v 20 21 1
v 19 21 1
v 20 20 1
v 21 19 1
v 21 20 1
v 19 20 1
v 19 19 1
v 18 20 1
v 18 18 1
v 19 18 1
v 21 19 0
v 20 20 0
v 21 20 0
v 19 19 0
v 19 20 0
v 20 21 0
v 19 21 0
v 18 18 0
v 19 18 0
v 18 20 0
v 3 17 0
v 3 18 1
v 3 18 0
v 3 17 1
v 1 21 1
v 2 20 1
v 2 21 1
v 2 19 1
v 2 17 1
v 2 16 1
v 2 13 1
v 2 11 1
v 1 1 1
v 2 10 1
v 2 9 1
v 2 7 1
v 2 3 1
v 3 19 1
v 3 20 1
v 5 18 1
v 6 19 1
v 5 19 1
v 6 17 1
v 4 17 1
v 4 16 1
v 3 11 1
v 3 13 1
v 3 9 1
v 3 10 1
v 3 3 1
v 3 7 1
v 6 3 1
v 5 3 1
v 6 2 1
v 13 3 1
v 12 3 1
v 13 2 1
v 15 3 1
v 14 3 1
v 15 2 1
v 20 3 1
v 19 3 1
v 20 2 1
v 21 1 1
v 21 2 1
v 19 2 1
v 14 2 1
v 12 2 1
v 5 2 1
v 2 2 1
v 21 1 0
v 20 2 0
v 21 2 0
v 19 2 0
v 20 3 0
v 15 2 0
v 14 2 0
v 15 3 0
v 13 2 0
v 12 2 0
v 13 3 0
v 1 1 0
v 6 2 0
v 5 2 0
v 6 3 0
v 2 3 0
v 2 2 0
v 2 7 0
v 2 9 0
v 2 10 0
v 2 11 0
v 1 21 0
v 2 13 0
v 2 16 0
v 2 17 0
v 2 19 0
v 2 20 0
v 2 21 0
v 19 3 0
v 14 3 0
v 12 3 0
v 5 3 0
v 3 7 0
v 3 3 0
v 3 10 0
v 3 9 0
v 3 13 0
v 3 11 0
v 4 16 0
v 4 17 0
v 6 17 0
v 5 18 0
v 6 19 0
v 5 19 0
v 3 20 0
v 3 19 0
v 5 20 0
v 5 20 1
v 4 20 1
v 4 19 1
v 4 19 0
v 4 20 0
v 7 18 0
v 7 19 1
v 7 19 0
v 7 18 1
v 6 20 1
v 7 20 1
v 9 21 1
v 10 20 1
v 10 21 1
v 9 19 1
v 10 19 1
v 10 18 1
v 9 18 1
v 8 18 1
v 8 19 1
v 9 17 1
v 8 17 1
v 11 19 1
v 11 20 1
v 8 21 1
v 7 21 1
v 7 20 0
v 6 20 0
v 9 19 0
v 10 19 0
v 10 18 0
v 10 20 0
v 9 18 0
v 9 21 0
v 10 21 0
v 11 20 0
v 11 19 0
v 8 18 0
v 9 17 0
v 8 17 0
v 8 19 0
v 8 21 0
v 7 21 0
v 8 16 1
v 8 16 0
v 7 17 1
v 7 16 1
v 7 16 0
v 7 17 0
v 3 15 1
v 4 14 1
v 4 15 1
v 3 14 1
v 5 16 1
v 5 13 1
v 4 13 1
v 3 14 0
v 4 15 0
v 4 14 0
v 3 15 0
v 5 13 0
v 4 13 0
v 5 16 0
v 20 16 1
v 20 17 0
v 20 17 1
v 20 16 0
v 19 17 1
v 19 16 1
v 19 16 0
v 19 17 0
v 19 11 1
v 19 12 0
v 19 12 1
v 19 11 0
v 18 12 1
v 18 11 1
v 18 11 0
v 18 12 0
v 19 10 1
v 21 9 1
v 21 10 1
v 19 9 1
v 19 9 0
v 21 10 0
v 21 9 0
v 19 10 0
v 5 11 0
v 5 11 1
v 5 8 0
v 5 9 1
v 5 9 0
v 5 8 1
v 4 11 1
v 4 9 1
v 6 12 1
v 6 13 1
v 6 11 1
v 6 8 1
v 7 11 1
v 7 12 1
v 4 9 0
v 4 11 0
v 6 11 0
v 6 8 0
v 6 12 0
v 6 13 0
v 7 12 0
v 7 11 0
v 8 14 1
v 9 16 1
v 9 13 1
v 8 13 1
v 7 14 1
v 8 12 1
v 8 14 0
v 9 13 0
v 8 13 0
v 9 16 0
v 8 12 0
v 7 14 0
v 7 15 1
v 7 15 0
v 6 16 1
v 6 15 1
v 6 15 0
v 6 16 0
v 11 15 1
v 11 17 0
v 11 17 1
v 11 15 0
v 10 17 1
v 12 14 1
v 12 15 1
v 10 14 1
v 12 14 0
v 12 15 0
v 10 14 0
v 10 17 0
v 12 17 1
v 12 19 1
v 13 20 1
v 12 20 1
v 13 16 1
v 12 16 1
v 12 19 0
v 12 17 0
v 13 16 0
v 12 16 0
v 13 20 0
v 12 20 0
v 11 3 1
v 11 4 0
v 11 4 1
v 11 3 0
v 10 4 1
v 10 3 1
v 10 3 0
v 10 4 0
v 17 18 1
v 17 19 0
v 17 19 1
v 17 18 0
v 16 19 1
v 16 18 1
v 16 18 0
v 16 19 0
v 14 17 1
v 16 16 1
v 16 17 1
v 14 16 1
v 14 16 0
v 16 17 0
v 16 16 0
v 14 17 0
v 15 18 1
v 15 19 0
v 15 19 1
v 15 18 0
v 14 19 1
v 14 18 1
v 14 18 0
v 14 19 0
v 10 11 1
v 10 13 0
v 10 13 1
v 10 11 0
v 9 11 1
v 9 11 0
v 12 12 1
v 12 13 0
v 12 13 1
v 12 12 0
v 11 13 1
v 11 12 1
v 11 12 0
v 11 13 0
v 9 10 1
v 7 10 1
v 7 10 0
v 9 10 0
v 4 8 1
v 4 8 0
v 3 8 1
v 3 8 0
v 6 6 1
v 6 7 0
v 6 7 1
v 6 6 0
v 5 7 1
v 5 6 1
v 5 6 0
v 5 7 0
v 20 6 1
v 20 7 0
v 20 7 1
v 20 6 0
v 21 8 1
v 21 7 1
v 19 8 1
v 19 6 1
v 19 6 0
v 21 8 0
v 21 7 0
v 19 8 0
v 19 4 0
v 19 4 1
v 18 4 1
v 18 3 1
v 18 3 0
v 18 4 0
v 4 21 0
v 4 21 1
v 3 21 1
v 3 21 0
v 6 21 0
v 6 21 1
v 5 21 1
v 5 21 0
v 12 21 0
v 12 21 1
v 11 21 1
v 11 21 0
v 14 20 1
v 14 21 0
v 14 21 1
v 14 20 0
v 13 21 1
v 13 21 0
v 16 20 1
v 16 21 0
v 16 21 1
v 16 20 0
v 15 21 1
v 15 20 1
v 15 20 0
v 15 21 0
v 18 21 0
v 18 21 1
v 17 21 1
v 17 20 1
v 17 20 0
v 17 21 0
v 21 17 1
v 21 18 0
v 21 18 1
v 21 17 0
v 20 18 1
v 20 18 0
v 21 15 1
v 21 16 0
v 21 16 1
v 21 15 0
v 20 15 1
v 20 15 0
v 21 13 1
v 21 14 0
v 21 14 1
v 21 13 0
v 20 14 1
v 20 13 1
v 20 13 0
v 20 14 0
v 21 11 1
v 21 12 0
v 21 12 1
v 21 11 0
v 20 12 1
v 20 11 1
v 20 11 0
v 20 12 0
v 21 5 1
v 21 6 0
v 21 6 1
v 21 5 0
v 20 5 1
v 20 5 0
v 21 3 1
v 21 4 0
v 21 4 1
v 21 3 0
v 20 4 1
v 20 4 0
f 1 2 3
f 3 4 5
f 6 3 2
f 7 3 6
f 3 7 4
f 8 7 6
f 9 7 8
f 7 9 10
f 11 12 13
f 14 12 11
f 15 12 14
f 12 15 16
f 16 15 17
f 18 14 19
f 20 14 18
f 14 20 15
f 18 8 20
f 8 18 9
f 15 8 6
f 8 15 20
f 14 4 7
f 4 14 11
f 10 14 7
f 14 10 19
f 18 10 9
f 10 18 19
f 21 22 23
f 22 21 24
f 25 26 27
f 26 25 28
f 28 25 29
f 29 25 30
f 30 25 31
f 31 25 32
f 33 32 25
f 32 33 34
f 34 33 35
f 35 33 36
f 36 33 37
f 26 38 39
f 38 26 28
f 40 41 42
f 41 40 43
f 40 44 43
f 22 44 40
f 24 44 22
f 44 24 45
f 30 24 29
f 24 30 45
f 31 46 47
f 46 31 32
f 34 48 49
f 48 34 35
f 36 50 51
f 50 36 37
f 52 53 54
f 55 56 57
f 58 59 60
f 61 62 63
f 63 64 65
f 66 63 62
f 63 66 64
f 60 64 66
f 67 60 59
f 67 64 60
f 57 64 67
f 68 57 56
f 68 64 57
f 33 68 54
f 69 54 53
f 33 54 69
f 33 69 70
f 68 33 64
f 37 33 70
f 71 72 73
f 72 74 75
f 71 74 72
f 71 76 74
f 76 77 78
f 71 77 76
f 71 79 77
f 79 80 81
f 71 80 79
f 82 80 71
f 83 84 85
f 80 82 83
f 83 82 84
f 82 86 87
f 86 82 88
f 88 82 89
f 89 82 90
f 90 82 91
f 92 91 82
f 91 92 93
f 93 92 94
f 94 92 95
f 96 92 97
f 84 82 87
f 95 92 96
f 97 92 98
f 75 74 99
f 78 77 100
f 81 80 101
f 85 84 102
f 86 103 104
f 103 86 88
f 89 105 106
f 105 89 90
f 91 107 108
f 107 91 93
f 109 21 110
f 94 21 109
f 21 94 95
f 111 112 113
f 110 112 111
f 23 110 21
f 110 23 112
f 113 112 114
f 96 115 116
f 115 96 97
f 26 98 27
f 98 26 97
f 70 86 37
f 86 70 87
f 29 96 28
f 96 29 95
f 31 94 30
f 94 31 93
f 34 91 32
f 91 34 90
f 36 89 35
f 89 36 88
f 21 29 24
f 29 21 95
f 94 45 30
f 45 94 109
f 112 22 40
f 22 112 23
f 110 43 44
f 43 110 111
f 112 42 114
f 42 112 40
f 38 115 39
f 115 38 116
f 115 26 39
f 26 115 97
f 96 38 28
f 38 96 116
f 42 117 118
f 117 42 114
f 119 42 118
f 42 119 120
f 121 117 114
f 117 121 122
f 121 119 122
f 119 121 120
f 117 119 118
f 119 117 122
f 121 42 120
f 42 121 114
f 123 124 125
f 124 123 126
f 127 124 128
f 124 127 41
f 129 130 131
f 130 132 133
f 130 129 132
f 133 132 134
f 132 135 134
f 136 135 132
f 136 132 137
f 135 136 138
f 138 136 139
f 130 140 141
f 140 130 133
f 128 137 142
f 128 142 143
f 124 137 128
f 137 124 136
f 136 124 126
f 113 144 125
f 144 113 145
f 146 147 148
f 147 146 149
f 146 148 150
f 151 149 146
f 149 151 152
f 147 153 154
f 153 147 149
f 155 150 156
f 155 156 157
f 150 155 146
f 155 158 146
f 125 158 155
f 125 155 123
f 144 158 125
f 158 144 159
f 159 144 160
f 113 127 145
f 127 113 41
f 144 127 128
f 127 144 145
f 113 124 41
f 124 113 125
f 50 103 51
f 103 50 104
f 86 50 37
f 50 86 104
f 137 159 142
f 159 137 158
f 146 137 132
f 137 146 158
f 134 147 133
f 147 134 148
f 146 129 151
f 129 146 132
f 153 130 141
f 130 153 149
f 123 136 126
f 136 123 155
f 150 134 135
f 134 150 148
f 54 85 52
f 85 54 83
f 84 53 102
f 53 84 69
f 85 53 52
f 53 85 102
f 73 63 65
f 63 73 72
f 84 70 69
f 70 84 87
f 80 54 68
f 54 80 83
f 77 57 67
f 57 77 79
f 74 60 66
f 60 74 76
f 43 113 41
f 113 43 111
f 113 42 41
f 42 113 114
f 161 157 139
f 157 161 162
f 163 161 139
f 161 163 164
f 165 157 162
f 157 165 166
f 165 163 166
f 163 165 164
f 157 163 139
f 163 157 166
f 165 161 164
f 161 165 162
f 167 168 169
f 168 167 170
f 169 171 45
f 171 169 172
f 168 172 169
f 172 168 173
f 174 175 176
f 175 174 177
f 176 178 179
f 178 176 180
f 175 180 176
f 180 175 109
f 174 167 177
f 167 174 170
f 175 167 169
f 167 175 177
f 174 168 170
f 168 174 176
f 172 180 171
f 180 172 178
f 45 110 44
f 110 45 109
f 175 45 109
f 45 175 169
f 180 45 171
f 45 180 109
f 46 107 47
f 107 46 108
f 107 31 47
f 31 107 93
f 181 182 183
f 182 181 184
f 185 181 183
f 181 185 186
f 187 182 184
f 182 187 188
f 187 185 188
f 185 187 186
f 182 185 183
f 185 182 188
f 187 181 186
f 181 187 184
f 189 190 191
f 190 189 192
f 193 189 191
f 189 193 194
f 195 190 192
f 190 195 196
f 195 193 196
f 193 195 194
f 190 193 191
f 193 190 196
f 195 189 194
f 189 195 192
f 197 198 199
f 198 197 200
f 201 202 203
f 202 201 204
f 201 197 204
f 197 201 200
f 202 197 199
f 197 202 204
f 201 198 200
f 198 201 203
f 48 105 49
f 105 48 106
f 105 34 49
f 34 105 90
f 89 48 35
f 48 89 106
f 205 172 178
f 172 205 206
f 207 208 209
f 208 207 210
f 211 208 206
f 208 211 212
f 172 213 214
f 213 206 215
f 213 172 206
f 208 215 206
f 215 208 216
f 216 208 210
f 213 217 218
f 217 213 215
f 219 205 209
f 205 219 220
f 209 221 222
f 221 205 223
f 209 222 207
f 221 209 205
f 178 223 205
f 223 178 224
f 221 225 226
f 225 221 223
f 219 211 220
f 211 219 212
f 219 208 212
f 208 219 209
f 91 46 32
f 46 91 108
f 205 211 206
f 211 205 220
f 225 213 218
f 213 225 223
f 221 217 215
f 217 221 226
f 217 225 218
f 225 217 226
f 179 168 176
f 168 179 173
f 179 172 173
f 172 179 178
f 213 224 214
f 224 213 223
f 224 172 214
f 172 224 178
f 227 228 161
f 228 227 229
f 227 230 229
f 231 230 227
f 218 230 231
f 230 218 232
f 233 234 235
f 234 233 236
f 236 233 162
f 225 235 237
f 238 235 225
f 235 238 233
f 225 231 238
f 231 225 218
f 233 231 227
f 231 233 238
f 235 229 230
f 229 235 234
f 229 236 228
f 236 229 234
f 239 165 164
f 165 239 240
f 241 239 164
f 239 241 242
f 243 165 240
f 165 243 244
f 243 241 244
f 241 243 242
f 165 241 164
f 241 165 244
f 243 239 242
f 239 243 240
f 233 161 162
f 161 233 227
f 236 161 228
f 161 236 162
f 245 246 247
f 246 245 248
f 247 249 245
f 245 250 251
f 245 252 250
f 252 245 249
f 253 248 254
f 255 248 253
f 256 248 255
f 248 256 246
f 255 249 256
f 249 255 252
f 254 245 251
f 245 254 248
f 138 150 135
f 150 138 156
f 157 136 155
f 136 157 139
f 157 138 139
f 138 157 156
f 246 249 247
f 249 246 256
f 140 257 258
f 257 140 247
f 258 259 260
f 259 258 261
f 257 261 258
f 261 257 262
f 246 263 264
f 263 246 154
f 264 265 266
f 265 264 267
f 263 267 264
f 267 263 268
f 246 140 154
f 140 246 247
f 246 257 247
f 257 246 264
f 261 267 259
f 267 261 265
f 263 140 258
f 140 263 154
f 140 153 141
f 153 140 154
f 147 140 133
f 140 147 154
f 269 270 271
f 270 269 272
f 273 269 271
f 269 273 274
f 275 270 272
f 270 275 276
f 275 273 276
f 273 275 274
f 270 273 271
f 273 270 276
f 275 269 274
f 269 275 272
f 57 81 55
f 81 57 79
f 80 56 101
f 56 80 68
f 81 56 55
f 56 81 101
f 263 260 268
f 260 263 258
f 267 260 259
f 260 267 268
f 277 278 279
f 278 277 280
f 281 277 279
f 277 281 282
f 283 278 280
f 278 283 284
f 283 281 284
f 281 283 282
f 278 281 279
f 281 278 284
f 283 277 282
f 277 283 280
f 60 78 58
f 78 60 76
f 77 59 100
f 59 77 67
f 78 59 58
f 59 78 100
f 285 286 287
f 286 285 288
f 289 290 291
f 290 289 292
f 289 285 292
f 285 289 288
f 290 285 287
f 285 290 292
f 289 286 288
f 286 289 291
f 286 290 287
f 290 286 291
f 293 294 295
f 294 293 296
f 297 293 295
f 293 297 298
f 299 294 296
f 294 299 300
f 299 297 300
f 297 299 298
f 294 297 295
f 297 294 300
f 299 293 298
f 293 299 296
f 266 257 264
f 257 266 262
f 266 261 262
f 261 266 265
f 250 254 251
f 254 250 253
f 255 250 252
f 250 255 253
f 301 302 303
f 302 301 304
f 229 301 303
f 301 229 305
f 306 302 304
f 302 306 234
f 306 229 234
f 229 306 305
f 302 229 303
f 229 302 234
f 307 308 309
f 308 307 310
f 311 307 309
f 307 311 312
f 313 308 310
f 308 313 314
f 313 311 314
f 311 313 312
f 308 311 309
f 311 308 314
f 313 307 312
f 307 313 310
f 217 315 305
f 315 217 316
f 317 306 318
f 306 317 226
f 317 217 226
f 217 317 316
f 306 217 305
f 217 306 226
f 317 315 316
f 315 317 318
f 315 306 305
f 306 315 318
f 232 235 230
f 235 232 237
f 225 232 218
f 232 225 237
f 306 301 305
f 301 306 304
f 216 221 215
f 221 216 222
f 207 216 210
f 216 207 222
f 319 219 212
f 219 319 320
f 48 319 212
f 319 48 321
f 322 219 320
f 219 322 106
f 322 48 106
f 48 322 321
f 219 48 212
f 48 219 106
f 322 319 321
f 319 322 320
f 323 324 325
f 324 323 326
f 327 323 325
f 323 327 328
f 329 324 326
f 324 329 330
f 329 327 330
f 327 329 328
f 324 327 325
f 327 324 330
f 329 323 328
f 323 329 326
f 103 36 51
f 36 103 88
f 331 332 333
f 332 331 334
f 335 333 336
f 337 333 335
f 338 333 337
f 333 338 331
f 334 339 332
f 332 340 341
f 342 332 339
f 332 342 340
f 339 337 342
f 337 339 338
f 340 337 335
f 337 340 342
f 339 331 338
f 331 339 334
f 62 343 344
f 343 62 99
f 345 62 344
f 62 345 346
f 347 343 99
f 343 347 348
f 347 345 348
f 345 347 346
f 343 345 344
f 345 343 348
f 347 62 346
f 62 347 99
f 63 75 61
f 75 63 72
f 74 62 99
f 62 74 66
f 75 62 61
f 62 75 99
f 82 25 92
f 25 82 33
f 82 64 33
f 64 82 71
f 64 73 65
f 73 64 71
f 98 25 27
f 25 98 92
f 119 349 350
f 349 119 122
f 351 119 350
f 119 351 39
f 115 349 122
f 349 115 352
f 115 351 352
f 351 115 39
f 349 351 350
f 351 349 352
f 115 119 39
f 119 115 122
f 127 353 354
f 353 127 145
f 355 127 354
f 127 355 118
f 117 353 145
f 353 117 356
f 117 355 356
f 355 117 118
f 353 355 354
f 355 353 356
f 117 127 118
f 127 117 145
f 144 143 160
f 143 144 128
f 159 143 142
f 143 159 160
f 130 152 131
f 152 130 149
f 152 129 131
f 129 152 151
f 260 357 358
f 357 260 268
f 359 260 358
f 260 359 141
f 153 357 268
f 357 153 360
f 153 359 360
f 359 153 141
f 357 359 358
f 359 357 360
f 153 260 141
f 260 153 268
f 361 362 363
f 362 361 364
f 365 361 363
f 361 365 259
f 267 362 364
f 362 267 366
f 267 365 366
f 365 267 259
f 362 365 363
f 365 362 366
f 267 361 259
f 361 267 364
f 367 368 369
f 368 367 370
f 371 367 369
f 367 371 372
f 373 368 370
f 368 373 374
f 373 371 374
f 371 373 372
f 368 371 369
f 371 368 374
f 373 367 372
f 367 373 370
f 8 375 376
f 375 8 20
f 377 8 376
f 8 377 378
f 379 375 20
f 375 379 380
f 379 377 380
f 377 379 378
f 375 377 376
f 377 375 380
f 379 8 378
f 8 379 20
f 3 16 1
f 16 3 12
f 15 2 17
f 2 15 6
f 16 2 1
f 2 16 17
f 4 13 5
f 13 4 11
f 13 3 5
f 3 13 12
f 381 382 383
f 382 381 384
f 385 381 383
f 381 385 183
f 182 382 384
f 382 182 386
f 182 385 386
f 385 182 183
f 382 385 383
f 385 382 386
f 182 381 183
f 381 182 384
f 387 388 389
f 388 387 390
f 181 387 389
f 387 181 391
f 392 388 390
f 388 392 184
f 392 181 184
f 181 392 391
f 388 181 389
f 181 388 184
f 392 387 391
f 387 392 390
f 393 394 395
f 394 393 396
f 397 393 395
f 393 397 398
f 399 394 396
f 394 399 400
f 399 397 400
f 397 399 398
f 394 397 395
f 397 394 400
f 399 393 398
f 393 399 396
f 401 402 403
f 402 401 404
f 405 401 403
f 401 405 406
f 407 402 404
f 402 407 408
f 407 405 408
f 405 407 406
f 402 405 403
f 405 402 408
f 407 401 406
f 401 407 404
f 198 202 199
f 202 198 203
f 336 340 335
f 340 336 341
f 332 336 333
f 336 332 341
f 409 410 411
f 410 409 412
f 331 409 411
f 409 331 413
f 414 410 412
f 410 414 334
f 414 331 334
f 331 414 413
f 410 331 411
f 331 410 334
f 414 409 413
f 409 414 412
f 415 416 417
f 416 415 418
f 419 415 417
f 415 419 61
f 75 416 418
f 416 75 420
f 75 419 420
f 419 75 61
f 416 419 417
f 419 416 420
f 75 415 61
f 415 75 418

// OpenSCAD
// file: ../../util/bitmap.scad
/*****************************************************************************
 * Module Bitmap Library
 * Modules to create bitmaps of unit squares from 1 or 2 dimensional vectors.
 *****************************************************************************
 * Copyright 2017 Chris Baker
 *
 * This program is free software: you can redistribute it and/or modify
 * it under the terms of the GNU Lesser General Public License as published by
 * the Free Software Foundation, either version 3 of the License, or
 * (at your option) any later version.
 *
 * This program is distributed in the hope that it will be useful,
 * but WITHOUT ANY WARRANTY; without even the implied warranty of
 * MERCHANTABILITY or FITNESS FOR A PARTICULAR PURPOSE.  See the
 * GNU Lesser General Public License for more details.
 *
 * You should have received a copy of the GNU Lesser General Public License
 * along with this program.  If not, see <http://www.gnu.org/licenses/>.
 *****************************************************************************
 * Usage:
 * Include this file with the "use" tag.
 * Depends on compat.scad library.
 *
 * API:
 *   1dbitmap(bitmap, center, expansion, vector_mode)
 *   2dbitmap(bitmap, center, expansion, vector_mode)
 *     Generate a 1 or 2-Dimensional field of modules based on the provided
 *     bitmap vector. See Bitmap Vectors below.
 *     The center flag determines whether to center the bitmap on the origin.
 *     The expansion value actually shrinks each cube in the x and y
 *     dimension by the specified amount.
 *     The vector_mode flag determines whether to create 3D solid geometry
 *     (unit cubes) or 2D vector geometry (squares).
 *
 * Bitmap Vectors:
 *   The bitmap vectors primarily provide boolean information.
 *   A module will be placed where these vectors have a postive value and
 *   skipped where they have a negative value. I.E. 0, -1, false, and undef
 *   are all equivalent and result in a skip. 1 and true are equivalent and
 *   result in a placed 1-unit module.
 *   Further, if the value is an integer it will be treated as a height for
 *   the module, allowing z-maps to be created.
 *   If the value is not an integer or boolean, it will be treated as a color
 *   reference. This can be a string or RGBA vector that will be used to
 *   color the module in the OpenSCAD preview window.
 *   In current versions of OpenSCAD, the color has no effect in the rendered
 *   view or STL output.
 *
 * Vector Mode:
 *   Although OpenSCAD supports generating 2D geometry, there are several
 *   caveats:
 *   - 2D and 3D geometry cannot be mixed
 *   - Extruding 2D geometry causes color information to be lost
 *   - All 2D geometry is projected onto the XY plane when rendering
 *   - Rendering also results in loss of color (same as 3D)
 *   - The SVG exporter is somewhat limited:
 *     - The pixel size of the image is hard-coded in the file
 *     - The title of the image is a generic string
 *     - The color selection for stroke and fill is fixed
 *     - The stroke-width is set to a large value that will cause overlap
 *     - The background is transparent
 *     - Only one path element is created with all of the geometry; there is
 *       no easy way to split up the geometry into multiple logical units.
 *     - These issues can mostly be resolved by hand-editing the file:
 *       - Remove or modify the width and height parameters from the svg
 *         element at the top of the file to provide better scaling.
 *       - Edit the title element at the top of the file to change the title.
 *       - Edit the stroke and fill parameters of the path element (these will
 *         probably be at the end of the file).
 *       - Set the stroke-width parameter for the path element to 0.
 *****************************************************************************/
use <compat.scad>

/*
 * 2dbitmap - Turn a 2D vector into a bitmap of cubes
 *
 * bitmap - 2D vector representing where to place each cube
 *          Value can either be boolean, z-height, or color
 * center - center cubes around the origin
 * expansion - size of gap around each pixel (screendoor)
 * vector_mode - create a 2D vector drawing instead of 3D extrusion
 */
module 2dbitmap(bitmap=[[1,0],[0,1]], center=false, expansion=0, vector_mode=false)
{
	ylen=len(bitmap)-1;

	for (y=[0:ylen]) {
		xlen=len(bitmap[y])-1;
		for (x=[0:xlen])
			translate([x-(center?xlen/2:0),ylen-y-(center?ylen/2:0),0])
				if (is_indexable(bitmap[y][x]))
					color(bitmap[y][x])
						if (vector_mode)
							square([1-expansion,1-expansion], center=center);
						else
							cube([1-expansion,1-expansion,1], center=center);
				else
					if (bitmap[y][x])
						if (vector_mode)
							square([1-expansion,1-expansion], center=center);
						else
							cube([1-expansion,1-expansion,clamp_nonnum(bitmap[y][x])], center=center);
	}
}

module 1dbitmap(bitmap=[1,0,1,0,1], center=false, expansion=0, vector_mode=false)
	2dbitmap([bitmap], center, expansion, vector_mode);

/*
 * Examples
 */

// 1D with z-height
translate([10,0,0]) scale([1,10,1])
	1dbitmap(bitmap=[1,1,0,2,0,0,3], expansion=.1);

// 1D with boolean
translate([-20,0,0]) scale([1,10,1])
	1dbitmap(bitmap=[true,false,true,false,true,true]);

// 2D with z-height
scale([2,2,1])
	2dbitmap(bitmap=[[1,0,2,1],[0,3,3,0],[1,1,0,1]],
		center=true);

// 1D with color
translate([0,-10,0]) scale([1,3,1])
	1dbitmap(bitmap=["red","white","blue",[0,0.3,0,0.5]]);

// 1D with color using 2D-vector-mode
translate([-7,-8,0]) scale([1,2])
	1dbitmap(bitmap=["red",0,"blue",0,"green"], vector_mode=true);
translate([-4.5,-10,0]) scale([1,2])
	1dbitmap(bitmap=["red",0,"blue",0,"green"], vector_mode=true, center=true);
// file: ../../util/bitlib.scad
/*****************************************************************************
 * Bit Manipulation Library
 * Provides some useful bit manipulation functions.
 *****************************************************************************
 * Copyright 2017 Chris Baker
 *
 * This program is free software: you can redistribute it and/or modify
 * it under the terms of the GNU Lesser General Public License as published by
 * the Free Software Foundation, either version 3 of the License, or
 * (at your option) any later version.
 *
 * This program is distributed in the hope that it will be useful,
 * but WITHOUT ANY WARRANTY; without even the implied warranty of
 * MERCHANTABILITY or FITNESS FOR A PARTICULAR PURPOSE.  See the
 * GNU Lesser General Public License for more details.
 *
 * You should have received a copy of the GNU Lesser General Public License
 * along with this program.  If not, see <http://www.gnu.org/licenses/>.
 *****************************************************************************
 * Usage:
 * Include this file with the "use" tag.
 * When run on its own, all echo statements in this
 * library should print "true".
 *
 * API:
 *   bit(v,b)
 *     Return the truth value of the b'th bit of v.
 *
 *   check_bit_size(v,b,signed=false)
 *     Determine whether the value v can be represented
 *     with b bits (b must be positive).
 *     The signed flag indicates whether to include the
 *     sign bit in the determination; otherwise negative
 *     values will result in undef being returned.
 *
 *   xor(a,b)
 *     Return the value of a xor b.
 *     Handles arbitrary size values for a and b.
 *     Handles negative values as expected (a positive
 *     result will be returned unless a and b have
 *     differing signs).
 *
 * TODO:
 *  - Change echos to asserts (future OpenSCAD version)
 *  - Add more functions
 *
 *****************************************************************************/

//Return the truth value of the b'th bit of v
function bit(v,b) =
	((v==undef)||(b==undef)||(b<0))?undef:
	(floor(v / pow(2, b)) % 2)?true:false;

echo("*** bit() testcases ***");
echo(0,bit(0,0)==false);
echo(1,bit(-1,0)==true);
echo(2,bit(1,0)==true);
echo(3,[for (i=[0:63]) bit(0,i)]==[for (i=[0:63]) false]); //0=0...0
echo(4,[for (i=[0:63]) bit(-1,i)]==[for (i=[0:63]) true]); //-1=1...1
echo(5,[for (i=[1:63]) bit(1,i)]==[for (i=[1:63]) false]); //1=0...01
echo(6,[for (i=[0:7]) bit(85,i)?1:0]==[1,0,1,0,1,0,1,0]); //85=01010101
echo(7,[for (i=[0:7]) bit(170,i)?1:0]==[0,1,0,1,0,1,0,1]); //170=10101010
echo(8,[for (i=[0:7]) bit(165,i)?1:0]==[1,0,1,0,0,1,0,1]); //165=10100101
echo(9,[for (i=[0:7]) bit(56,i)?1:0]==[0,0,0,1,1,1,0,0]); //56=00111000
echo(10,[for (i=[0:7]) bit(-3,i)?1:0]==[1,0,1,1,1,1,1,1]); //-3=1...101
//(2^64)=0...01 0...0
echo(11,bit(pow(2,64),64)==true);
echo(12,[for (i=[0:63]) bit(pow(2,64),i)]==[for (i=[0:63]) false]);
echo(13,[for (i=[65:127]) bit(pow(2,64),i)]==[for (i=[1:63]) false]);
//-(2^64)=1...1 0...0
echo(14,[for (i=[0:63]) bit(-pow(2,64),i)]==[for (i=[0:63]) false]);
echo(15,[for (i=[64:127]) bit(-pow(2,64),i)]==[for (i=[0:63]) true]);
echo(16,bit(10,-1)==undef);
echo(17,bit(10,undef)==undef);
echo(18,bit(undef,3)==undef);

//return true if v can be represented in b bits
//if signed flag is set. the result will be adjusted
//to account for the needed sign bit
function check_bit_size(v,b,signed=false) =
	(b<0)?undef:
	(v==undef)?undef:
	(b==0)?false:
	(v==0)?true: //(b>0)
	(signed)?
		(v<0)?(-pow(2,b-1)<(v+1)):
			(pow(2,b-1)>(v+1)):
		(v<0)?undef:
			(pow(2,b)>v);

echo("*** check_bit_size() testcases ***");
echo(0,check_bit_size(-1,2)==undef);
echo(1,check_bit_size(2,-4)==undef);
echo(2,check_bit_size(2,-4,signed=true)==undef);
echo(3,check_bit_size(0,0)==false);
echo(4,check_bit_size(0,1)==true);
echo(5,check_bit_size(1,0)==false);
echo(6,check_bit_size(1,1)==true);
echo(7,check_bit_size(7,3)==true);
echo(8,check_bit_size(8,3)==false);
echo(9,check_bit_size(1,3)==true);
echo(10,check_bit_size(256,8)==false);
echo(11,check_bit_size(255,8)==true);
echo(12,check_bit_size(10,2)==false);
echo(13,check_bit_size(10,4)==true);
echo(14,check_bit_size(-10,2,signed=true)==false);
echo(15,check_bit_size(-10,4,signed=true)==false);
echo(16,check_bit_size(-10,5,signed=true)==true);
echo(17,check_bit_size(-1,0,signed=true)==false);
echo(18,check_bit_size(-1,1,signed=true)==true);
echo(19,check_bit_size(0,0,signed=true)==false);
echo(20,check_bit_size(0,1,signed=true)==true);
echo(21,check_bit_size(-2,2,signed=true)==true);
echo(22,check_bit_size(-3,2,signed=true)==false);
echo(23,check_bit_size(-3,3,signed=true)==true);
echo(24,check_bit_size(-8,3,signed=true)==false);
echo(25,check_bit_size(-8,4,signed=true)==true);
echo(26,check_bit_size(undef,4)==undef);
echo(27,check_bit_size(undef,4,signed=true)==undef);

//return the value of a xor b
//runs recursively until all bits of a and b are exhausted
function xor(a,b,i=0) =
	((a==undef)||(b==undef))?undef:
	let (c=bit(a,i), d=bit(b,i),
		 v=((c||d) && !(c&&d))?pow(2,i):0)
		(check_bit_size(a,i,signed=true) &&
		 check_bit_size(b,i,signed=true))?
			-v: //special case for sign bit
			v+xor(a,b,i+1); //recursively add powers of 2

echo("*** xor() testcases ***");
echo(0,xor(42,0)==42);
echo(1,xor(42,42)==0);
echo(2,xor(169,238)==71); //10101001^11101110=01000111=71
echo(3,xor(238,169)==71);
echo(4,xor(42,238)==196); //00101010^11101110=11000100=196
echo(5,xor(169,42)==131); //10101001^00101010=10000011=131
echo(6,xor(-8,-10)==14); //11000^10110=01110=14
echo(7,xor(-7,-10)==15); //11001^10110=01111=15
echo(8,xor(9,-10)==-1); //01001^10110=11111=-1
echo(9,xor(9,-12)==-3); //01001^10100=11101=-3
echo(10,xor(undef,0)==undef);
// file: ../../util/stringlib.scad
/*****************************************************************************
 * String Manipulation Library
 * Provides some useful string manipulation functions.
 *****************************************************************************
 * Copyright 2017 Chris Baker
 *
 * This program is free software: you can redistribute it and/or modify
 * it under the terms of the GNU Lesser General Public License as published by
 * the Free Software Foundation, either version 3 of the License, or
 * (at your option) any later version.
 *
 * This program is distributed in the hope that it will be useful,
 * but WITHOUT ANY WARRANTY; without even the implied warranty of
 * MERCHANTABILITY or FITNESS FOR A PARTICULAR PURPOSE.  See the
 * GNU Lesser General Public License for more details.
 *
 * You should have received a copy of the GNU Lesser General Public License
 * along with this program.  If not, see <http://www.gnu.org/licenses/>.
 *****************************************************************************
 * Usage:
 * Include this file with the "use" tag.
 * When run on its own, all echo statements in this library should print
 * "true".
 *
 * API:
 *   atoi(a)
 *     Convert the string of numerals, a, to a vector of individual decimal
 *     numbers.
 *
 *   ascii_to_vec(a)
 *     Convert the ASCII string, a, into a vector of decimal numbers.
 *
 * TODO:
 *  - Change echos to asserts (future OpenSCAD version)
 *
 *****************************************************************************/

/*
 * atoi - convert ASCII numerals to a vector of individual decimal numbers
 *
 * a - the ASCII string of numerals
 */
function atoi(a) = (len(a)==undef)?undef:
[
	let (val = search(a, "0123456789"))
		for (i = val) i
];

echo("*** atoi() testcases ***");
echo(ascii_to_vec(undef)==undef);
echo(ascii_to_vec(true)==undef);
echo(ascii_to_vec(false)==undef);
echo(ascii_to_vec("")==[]);
echo(atoi("0")==[0]);
echo(atoi("1")==[1]);
echo(atoi("2")==[2]);
echo(atoi("3")==[3]);
echo(atoi("4")==[4]);
echo(atoi("5")==[5]);
echo(atoi("6")==[6]);
echo(atoi("7")==[7]);
echo(atoi("8")==[8]);
echo(atoi("9")==[9]);
echo(atoi("123")==[1,2,3]);
echo(atoi("1a23b")==[1,2,3]); //degenerate case, don't really care too much about the result

/*
 * ascii_to_vec - convert ASCII string to decimal vector
 *
 * a - the ASCII string to vectorize
 */
function ascii_to_vec(a) = (len(a)==undef)?undef:
[
	let (val = search(a, "\x01\x02\x03\x04\x05\x06\x07\x08\x09\x0a\x0b\x0c\x0d\x0e\x0f\x10\x11\x12\x13\x14\x15\x16\x17\x18\x19\x1a\x1b\x1c\x1d\x1e\x1f !\"#$%&'()*+,-./0123456789:;<=>?@ABCDEFGHIJKLMNOPQRSTUVWXYZ[\\]^_`abcdefghijklmnopqrstuvwxyz{|}~\x7f"))
		for (i = val) i+1
];

echo("*** ascii_to_vec() testcases ***");
echo(ascii_to_vec(undef)==undef);
echo(ascii_to_vec(true)==undef);
echo(ascii_to_vec(false)==undef);
echo(ascii_to_vec("")==[]);
echo(ascii_to_vec("0")==[48]);
echo(ascii_to_vec("a")==[97]);
echo(ascii_to_vec("0123456789")==[48,49,50,51,52,53,54,55,56,57]);
echo(ascii_to_vec("The quick brown fox jumped over the lazy dog.")
	==[84,104,101,32,113,117,105,99,107,32,98,114,111,119,110,32,102,111,120,32,106,117,109,112,101,100,32,111,118,101,114,32,116,104,101,32,108,97,122,121,32,100,111,103,46]);
// main file
/* Unit Test 07: 20x20 - 22 data bytes, 18 ecc bytes - fnc1 mode */
use <../datamatrix.scad>
data_matrix(
	concat(
		[fnc1_mode()],
		dm_ascii("01034531200000111709112510ABCD1234")
	),
	mark="black");
